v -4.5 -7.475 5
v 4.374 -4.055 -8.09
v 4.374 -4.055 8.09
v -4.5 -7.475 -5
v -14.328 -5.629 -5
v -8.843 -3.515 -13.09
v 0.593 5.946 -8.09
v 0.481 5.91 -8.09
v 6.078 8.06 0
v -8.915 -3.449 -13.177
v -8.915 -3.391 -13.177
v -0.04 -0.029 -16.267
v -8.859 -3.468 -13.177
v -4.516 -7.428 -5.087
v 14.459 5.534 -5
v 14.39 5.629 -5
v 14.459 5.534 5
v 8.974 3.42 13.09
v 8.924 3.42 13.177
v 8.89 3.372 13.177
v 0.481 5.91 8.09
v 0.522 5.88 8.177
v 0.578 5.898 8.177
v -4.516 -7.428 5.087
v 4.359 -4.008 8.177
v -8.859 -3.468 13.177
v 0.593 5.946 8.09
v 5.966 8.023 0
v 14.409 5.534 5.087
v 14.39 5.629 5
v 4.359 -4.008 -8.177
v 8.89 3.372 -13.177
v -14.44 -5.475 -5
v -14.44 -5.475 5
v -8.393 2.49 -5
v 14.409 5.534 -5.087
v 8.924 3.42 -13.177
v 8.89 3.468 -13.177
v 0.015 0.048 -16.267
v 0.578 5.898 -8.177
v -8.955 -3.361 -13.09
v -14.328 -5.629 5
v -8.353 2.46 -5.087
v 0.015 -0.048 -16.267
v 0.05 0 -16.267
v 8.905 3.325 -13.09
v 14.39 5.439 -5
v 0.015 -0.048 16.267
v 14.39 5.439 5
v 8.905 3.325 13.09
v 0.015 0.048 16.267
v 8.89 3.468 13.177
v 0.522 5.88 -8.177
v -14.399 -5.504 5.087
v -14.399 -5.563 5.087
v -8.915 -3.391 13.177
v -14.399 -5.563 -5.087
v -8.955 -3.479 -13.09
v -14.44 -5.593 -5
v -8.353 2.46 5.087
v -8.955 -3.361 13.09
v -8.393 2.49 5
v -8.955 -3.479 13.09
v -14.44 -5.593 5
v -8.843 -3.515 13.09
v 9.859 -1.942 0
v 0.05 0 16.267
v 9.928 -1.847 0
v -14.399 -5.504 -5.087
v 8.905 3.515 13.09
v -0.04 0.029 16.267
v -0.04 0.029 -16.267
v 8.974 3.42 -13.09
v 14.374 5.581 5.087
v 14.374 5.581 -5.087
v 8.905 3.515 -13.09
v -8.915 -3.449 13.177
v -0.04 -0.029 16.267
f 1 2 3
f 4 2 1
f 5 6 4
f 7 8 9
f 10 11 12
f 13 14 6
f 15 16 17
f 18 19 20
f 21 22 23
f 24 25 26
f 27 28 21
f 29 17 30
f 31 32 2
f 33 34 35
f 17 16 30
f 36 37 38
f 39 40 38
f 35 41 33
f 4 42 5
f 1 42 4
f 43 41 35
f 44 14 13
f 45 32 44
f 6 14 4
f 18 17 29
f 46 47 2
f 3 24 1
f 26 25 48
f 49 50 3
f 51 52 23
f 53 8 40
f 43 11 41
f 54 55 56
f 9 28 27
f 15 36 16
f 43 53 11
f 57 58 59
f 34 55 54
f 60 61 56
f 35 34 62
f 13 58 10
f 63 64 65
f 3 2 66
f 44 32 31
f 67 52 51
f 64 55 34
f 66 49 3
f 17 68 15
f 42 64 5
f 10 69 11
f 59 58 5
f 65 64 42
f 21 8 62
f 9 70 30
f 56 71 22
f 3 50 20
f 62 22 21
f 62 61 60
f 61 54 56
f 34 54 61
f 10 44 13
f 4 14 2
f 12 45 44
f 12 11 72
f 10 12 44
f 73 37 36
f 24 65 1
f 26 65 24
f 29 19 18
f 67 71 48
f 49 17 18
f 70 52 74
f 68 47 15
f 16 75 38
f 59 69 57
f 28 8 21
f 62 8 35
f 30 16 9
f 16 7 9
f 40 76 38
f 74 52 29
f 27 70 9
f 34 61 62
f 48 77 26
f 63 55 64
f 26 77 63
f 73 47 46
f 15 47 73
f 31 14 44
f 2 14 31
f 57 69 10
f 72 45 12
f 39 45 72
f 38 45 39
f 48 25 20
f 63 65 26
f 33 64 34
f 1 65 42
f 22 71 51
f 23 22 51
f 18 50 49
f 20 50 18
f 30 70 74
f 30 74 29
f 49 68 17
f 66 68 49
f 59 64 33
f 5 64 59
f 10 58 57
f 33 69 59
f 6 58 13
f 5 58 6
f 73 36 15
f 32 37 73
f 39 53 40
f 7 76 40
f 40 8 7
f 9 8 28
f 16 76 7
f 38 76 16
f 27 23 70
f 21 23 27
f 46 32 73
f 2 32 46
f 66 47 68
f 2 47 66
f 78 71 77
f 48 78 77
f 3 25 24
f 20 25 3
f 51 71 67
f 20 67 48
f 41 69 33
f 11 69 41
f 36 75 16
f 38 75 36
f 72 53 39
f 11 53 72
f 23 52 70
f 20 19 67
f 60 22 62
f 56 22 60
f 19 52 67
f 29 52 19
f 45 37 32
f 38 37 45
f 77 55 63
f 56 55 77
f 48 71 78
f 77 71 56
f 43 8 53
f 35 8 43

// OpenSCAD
// Auto-generated OpenSCAD file

    inner_points = 10*[[1.4359011870482463, 0.5533730837177137, -0.5000000000000805], [-1.4359011870482463, -0.5533730837177137, 0.5000000000000805], [0.8874357380822848, 0.34200337419673843, 1.3090169943748977], [1.483420692140161e-13, -1.4966410443445797e-13, 1.618033988749895], [-1.483420692140161e-13, 1.4966410443445797e-13, -1.618033988749895], [-0.8874357380822848, -0.34200337419673843, -1.3090169943748977], [1.4359011870483378, 0.5533730837176212, 0.4999999999999195], [-0.887435738082045, -0.3420033741969806, 1.3090169943749972], [0.887435738082045, 0.3420033741969806, -1.3090169943749972], [-1.4359011870483378, -0.5533730837176212, -0.4999999999999195], [0.05622638989055023, 0.5850898186537883, 0.8090169943749964], [0.434336020988879, -0.39603500310477363, 0.809016994374871], [0.6046918388566034, 0.7964595281746711, 1.8207657603852567e-14], [0.9828014699549321, -0.18466529358389083, -1.0721978860317449e-13], [-0.8312093481916429, 0.2430864444569574, 0.5000000000000987], [-0.45309971709331415, -0.7380383773016045, 0.49999999999997324], [0.05622638989040191, 0.5850898186539379, -0.8090169943748985], [0.4343360209887307, -0.3960350031046239, -0.809016994375024], [-0.8312093481917346, 0.24308644445704983, -0.4999999999999013], [-0.4530997170934058, -0.738038377301512, -0.5000000000000268]];

    outer_points = 10*[[-1.562151832989105, 0.0, -0.42156332791014234], [1.562151832989105, 0.0, 0.42156332791014234], [-0.5807729208038567, 1.4921233423461835, 0.23303376243906446], [0.3846900075713595, 1.4921233423461835, 0.4935742274980496], [-0.3846900075713595, -1.4921233423461835, -0.4935742274980496], [0.5807729208038567, -1.4921233423461835, -0.23303376243906446], [-1.3244003331775505, 0.9221829409770366, -0.11651767934537474], [1.2032144281867707, 0.9221829409770366, 0.5655861136237528], [-1.2032144281867707, -0.9221829409770366, -0.5655861136237528], [1.3244003331775505, -0.9221829409770366, 0.11651767934537474], [-0.18701174725268985, 0.6962659651294776, 0.692993731711776], [0.07861977866300407, 0.9533850298427866, -0.29133471347343615], [-0.9306391596263837, 0.12632556376033077, 0.34344228992733694], [-0.6650076337106898, 0.3834446284736398, -0.6408861552578753], [0.6315126733627214, 0.12632556376033077, 0.7650056178374792], [0.8971441992784153, 0.3834446284736398, -0.21932282734773292], [-0.5717017548240494, -0.7958573772167059, 0.19941950421372653], [-0.3060702289083555, -0.5387383125033969, -0.7849089409714857], [0.3937611735511668, -0.7958573772167059, 0.45995996927271166], [0.6593926994668606, -0.5387383125033969, -0.5243684759125006]];

    // Convex hull for inner set (I)
    module inner_hull() {
        hull() {
            for (p = inner_points) {
                translate(p) sphere(r=0.1);
            }
        }
    }

    // Convex hull for outer set (O) minus inner hull (O \ I)
    module outer_minus_inner() {
        difference() {
            hull() {
                for (p = outer_points) {
                    translate(p) sphere(r=0.1);
                }
            }
            inner_hull(); // Subtract inner hull
        }
    }

    // Convex hull for outer set (O) minus all translated inner hulls
    module outer_minus_AllTranslationInner() {
        difference() {
            hull() {
                for (p = outer_points) {
                    translate(p) sphere(r=0.1);
                }
            }
            hull() {
                translate([0,0,50]) inner_hull();
                translate([0,0,-50]) inner_hull();
            }; // Subtract translated inner hulls
        }
    }

    // Difference between outer_minus_inner and outer_minus_AllTranslationInner
    module outer_minus_inner_diff() {
        difference() {
            // Outer minus inner
            difference() {
                hull() {
                    for (p = outer_points) {
                        translate(p) sphere(r=0.1);
                    }
                }
                inner_hull();
            }

            // Subtract Outer minus AllTranslationInner
            difference() {
                hull() {
                    for (p = outer_points) {
                        translate(p) sphere(r=0.1);
                    }
                }
                hull() {
                    translate([0,0,50]) inner_hull();
                    translate([0,0,-50]) inner_hull();
                };
            }
        }
    }

    // Rendering all with colors applied
    color([1, 0, 0, 0.5]) inner_hull(); // Transparent red
    
